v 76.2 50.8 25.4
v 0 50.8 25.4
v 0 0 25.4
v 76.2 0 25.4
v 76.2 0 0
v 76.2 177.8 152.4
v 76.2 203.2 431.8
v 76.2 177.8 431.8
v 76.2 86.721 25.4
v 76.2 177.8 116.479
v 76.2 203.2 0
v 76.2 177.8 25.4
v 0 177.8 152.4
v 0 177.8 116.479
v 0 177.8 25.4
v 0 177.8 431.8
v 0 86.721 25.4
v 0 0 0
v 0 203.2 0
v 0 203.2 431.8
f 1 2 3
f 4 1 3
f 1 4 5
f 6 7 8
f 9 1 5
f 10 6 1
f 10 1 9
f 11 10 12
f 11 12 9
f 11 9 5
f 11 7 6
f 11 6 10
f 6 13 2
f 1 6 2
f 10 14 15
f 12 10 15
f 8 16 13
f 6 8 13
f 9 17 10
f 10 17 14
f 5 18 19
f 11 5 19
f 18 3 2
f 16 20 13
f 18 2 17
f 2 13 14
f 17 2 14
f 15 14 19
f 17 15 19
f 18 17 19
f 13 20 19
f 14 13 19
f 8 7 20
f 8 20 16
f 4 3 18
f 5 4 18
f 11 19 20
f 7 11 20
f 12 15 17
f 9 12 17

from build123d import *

# Parameters (mm, degrees)
BOSS_EXTRUDE1_DEPTH = 76.2


with BuildPart() as part:
    # Sketch1 → Boss-Extrude1 (new body)
    with BuildSketch(Plane(origin=(0, 0, 0), x_dir=(0, 0, -1), z_dir=(1, 0, 0))):
        Polygon((0, 0), (0, 203.2), (-431.8, 203.2), (-431.8, 177.8), (-152.4, 177.8), (-25.4, 50.8), (-25.4, 0), align=None)
        Polygon((-116.478975516, 177.8), (-25.4, 177.8), (-25.4, 86.721024484), align=None, mode=Mode.SUBTRACT)
    extrude(amount=BOSS_EXTRUDE1_DEPTH)


solid = part.part
